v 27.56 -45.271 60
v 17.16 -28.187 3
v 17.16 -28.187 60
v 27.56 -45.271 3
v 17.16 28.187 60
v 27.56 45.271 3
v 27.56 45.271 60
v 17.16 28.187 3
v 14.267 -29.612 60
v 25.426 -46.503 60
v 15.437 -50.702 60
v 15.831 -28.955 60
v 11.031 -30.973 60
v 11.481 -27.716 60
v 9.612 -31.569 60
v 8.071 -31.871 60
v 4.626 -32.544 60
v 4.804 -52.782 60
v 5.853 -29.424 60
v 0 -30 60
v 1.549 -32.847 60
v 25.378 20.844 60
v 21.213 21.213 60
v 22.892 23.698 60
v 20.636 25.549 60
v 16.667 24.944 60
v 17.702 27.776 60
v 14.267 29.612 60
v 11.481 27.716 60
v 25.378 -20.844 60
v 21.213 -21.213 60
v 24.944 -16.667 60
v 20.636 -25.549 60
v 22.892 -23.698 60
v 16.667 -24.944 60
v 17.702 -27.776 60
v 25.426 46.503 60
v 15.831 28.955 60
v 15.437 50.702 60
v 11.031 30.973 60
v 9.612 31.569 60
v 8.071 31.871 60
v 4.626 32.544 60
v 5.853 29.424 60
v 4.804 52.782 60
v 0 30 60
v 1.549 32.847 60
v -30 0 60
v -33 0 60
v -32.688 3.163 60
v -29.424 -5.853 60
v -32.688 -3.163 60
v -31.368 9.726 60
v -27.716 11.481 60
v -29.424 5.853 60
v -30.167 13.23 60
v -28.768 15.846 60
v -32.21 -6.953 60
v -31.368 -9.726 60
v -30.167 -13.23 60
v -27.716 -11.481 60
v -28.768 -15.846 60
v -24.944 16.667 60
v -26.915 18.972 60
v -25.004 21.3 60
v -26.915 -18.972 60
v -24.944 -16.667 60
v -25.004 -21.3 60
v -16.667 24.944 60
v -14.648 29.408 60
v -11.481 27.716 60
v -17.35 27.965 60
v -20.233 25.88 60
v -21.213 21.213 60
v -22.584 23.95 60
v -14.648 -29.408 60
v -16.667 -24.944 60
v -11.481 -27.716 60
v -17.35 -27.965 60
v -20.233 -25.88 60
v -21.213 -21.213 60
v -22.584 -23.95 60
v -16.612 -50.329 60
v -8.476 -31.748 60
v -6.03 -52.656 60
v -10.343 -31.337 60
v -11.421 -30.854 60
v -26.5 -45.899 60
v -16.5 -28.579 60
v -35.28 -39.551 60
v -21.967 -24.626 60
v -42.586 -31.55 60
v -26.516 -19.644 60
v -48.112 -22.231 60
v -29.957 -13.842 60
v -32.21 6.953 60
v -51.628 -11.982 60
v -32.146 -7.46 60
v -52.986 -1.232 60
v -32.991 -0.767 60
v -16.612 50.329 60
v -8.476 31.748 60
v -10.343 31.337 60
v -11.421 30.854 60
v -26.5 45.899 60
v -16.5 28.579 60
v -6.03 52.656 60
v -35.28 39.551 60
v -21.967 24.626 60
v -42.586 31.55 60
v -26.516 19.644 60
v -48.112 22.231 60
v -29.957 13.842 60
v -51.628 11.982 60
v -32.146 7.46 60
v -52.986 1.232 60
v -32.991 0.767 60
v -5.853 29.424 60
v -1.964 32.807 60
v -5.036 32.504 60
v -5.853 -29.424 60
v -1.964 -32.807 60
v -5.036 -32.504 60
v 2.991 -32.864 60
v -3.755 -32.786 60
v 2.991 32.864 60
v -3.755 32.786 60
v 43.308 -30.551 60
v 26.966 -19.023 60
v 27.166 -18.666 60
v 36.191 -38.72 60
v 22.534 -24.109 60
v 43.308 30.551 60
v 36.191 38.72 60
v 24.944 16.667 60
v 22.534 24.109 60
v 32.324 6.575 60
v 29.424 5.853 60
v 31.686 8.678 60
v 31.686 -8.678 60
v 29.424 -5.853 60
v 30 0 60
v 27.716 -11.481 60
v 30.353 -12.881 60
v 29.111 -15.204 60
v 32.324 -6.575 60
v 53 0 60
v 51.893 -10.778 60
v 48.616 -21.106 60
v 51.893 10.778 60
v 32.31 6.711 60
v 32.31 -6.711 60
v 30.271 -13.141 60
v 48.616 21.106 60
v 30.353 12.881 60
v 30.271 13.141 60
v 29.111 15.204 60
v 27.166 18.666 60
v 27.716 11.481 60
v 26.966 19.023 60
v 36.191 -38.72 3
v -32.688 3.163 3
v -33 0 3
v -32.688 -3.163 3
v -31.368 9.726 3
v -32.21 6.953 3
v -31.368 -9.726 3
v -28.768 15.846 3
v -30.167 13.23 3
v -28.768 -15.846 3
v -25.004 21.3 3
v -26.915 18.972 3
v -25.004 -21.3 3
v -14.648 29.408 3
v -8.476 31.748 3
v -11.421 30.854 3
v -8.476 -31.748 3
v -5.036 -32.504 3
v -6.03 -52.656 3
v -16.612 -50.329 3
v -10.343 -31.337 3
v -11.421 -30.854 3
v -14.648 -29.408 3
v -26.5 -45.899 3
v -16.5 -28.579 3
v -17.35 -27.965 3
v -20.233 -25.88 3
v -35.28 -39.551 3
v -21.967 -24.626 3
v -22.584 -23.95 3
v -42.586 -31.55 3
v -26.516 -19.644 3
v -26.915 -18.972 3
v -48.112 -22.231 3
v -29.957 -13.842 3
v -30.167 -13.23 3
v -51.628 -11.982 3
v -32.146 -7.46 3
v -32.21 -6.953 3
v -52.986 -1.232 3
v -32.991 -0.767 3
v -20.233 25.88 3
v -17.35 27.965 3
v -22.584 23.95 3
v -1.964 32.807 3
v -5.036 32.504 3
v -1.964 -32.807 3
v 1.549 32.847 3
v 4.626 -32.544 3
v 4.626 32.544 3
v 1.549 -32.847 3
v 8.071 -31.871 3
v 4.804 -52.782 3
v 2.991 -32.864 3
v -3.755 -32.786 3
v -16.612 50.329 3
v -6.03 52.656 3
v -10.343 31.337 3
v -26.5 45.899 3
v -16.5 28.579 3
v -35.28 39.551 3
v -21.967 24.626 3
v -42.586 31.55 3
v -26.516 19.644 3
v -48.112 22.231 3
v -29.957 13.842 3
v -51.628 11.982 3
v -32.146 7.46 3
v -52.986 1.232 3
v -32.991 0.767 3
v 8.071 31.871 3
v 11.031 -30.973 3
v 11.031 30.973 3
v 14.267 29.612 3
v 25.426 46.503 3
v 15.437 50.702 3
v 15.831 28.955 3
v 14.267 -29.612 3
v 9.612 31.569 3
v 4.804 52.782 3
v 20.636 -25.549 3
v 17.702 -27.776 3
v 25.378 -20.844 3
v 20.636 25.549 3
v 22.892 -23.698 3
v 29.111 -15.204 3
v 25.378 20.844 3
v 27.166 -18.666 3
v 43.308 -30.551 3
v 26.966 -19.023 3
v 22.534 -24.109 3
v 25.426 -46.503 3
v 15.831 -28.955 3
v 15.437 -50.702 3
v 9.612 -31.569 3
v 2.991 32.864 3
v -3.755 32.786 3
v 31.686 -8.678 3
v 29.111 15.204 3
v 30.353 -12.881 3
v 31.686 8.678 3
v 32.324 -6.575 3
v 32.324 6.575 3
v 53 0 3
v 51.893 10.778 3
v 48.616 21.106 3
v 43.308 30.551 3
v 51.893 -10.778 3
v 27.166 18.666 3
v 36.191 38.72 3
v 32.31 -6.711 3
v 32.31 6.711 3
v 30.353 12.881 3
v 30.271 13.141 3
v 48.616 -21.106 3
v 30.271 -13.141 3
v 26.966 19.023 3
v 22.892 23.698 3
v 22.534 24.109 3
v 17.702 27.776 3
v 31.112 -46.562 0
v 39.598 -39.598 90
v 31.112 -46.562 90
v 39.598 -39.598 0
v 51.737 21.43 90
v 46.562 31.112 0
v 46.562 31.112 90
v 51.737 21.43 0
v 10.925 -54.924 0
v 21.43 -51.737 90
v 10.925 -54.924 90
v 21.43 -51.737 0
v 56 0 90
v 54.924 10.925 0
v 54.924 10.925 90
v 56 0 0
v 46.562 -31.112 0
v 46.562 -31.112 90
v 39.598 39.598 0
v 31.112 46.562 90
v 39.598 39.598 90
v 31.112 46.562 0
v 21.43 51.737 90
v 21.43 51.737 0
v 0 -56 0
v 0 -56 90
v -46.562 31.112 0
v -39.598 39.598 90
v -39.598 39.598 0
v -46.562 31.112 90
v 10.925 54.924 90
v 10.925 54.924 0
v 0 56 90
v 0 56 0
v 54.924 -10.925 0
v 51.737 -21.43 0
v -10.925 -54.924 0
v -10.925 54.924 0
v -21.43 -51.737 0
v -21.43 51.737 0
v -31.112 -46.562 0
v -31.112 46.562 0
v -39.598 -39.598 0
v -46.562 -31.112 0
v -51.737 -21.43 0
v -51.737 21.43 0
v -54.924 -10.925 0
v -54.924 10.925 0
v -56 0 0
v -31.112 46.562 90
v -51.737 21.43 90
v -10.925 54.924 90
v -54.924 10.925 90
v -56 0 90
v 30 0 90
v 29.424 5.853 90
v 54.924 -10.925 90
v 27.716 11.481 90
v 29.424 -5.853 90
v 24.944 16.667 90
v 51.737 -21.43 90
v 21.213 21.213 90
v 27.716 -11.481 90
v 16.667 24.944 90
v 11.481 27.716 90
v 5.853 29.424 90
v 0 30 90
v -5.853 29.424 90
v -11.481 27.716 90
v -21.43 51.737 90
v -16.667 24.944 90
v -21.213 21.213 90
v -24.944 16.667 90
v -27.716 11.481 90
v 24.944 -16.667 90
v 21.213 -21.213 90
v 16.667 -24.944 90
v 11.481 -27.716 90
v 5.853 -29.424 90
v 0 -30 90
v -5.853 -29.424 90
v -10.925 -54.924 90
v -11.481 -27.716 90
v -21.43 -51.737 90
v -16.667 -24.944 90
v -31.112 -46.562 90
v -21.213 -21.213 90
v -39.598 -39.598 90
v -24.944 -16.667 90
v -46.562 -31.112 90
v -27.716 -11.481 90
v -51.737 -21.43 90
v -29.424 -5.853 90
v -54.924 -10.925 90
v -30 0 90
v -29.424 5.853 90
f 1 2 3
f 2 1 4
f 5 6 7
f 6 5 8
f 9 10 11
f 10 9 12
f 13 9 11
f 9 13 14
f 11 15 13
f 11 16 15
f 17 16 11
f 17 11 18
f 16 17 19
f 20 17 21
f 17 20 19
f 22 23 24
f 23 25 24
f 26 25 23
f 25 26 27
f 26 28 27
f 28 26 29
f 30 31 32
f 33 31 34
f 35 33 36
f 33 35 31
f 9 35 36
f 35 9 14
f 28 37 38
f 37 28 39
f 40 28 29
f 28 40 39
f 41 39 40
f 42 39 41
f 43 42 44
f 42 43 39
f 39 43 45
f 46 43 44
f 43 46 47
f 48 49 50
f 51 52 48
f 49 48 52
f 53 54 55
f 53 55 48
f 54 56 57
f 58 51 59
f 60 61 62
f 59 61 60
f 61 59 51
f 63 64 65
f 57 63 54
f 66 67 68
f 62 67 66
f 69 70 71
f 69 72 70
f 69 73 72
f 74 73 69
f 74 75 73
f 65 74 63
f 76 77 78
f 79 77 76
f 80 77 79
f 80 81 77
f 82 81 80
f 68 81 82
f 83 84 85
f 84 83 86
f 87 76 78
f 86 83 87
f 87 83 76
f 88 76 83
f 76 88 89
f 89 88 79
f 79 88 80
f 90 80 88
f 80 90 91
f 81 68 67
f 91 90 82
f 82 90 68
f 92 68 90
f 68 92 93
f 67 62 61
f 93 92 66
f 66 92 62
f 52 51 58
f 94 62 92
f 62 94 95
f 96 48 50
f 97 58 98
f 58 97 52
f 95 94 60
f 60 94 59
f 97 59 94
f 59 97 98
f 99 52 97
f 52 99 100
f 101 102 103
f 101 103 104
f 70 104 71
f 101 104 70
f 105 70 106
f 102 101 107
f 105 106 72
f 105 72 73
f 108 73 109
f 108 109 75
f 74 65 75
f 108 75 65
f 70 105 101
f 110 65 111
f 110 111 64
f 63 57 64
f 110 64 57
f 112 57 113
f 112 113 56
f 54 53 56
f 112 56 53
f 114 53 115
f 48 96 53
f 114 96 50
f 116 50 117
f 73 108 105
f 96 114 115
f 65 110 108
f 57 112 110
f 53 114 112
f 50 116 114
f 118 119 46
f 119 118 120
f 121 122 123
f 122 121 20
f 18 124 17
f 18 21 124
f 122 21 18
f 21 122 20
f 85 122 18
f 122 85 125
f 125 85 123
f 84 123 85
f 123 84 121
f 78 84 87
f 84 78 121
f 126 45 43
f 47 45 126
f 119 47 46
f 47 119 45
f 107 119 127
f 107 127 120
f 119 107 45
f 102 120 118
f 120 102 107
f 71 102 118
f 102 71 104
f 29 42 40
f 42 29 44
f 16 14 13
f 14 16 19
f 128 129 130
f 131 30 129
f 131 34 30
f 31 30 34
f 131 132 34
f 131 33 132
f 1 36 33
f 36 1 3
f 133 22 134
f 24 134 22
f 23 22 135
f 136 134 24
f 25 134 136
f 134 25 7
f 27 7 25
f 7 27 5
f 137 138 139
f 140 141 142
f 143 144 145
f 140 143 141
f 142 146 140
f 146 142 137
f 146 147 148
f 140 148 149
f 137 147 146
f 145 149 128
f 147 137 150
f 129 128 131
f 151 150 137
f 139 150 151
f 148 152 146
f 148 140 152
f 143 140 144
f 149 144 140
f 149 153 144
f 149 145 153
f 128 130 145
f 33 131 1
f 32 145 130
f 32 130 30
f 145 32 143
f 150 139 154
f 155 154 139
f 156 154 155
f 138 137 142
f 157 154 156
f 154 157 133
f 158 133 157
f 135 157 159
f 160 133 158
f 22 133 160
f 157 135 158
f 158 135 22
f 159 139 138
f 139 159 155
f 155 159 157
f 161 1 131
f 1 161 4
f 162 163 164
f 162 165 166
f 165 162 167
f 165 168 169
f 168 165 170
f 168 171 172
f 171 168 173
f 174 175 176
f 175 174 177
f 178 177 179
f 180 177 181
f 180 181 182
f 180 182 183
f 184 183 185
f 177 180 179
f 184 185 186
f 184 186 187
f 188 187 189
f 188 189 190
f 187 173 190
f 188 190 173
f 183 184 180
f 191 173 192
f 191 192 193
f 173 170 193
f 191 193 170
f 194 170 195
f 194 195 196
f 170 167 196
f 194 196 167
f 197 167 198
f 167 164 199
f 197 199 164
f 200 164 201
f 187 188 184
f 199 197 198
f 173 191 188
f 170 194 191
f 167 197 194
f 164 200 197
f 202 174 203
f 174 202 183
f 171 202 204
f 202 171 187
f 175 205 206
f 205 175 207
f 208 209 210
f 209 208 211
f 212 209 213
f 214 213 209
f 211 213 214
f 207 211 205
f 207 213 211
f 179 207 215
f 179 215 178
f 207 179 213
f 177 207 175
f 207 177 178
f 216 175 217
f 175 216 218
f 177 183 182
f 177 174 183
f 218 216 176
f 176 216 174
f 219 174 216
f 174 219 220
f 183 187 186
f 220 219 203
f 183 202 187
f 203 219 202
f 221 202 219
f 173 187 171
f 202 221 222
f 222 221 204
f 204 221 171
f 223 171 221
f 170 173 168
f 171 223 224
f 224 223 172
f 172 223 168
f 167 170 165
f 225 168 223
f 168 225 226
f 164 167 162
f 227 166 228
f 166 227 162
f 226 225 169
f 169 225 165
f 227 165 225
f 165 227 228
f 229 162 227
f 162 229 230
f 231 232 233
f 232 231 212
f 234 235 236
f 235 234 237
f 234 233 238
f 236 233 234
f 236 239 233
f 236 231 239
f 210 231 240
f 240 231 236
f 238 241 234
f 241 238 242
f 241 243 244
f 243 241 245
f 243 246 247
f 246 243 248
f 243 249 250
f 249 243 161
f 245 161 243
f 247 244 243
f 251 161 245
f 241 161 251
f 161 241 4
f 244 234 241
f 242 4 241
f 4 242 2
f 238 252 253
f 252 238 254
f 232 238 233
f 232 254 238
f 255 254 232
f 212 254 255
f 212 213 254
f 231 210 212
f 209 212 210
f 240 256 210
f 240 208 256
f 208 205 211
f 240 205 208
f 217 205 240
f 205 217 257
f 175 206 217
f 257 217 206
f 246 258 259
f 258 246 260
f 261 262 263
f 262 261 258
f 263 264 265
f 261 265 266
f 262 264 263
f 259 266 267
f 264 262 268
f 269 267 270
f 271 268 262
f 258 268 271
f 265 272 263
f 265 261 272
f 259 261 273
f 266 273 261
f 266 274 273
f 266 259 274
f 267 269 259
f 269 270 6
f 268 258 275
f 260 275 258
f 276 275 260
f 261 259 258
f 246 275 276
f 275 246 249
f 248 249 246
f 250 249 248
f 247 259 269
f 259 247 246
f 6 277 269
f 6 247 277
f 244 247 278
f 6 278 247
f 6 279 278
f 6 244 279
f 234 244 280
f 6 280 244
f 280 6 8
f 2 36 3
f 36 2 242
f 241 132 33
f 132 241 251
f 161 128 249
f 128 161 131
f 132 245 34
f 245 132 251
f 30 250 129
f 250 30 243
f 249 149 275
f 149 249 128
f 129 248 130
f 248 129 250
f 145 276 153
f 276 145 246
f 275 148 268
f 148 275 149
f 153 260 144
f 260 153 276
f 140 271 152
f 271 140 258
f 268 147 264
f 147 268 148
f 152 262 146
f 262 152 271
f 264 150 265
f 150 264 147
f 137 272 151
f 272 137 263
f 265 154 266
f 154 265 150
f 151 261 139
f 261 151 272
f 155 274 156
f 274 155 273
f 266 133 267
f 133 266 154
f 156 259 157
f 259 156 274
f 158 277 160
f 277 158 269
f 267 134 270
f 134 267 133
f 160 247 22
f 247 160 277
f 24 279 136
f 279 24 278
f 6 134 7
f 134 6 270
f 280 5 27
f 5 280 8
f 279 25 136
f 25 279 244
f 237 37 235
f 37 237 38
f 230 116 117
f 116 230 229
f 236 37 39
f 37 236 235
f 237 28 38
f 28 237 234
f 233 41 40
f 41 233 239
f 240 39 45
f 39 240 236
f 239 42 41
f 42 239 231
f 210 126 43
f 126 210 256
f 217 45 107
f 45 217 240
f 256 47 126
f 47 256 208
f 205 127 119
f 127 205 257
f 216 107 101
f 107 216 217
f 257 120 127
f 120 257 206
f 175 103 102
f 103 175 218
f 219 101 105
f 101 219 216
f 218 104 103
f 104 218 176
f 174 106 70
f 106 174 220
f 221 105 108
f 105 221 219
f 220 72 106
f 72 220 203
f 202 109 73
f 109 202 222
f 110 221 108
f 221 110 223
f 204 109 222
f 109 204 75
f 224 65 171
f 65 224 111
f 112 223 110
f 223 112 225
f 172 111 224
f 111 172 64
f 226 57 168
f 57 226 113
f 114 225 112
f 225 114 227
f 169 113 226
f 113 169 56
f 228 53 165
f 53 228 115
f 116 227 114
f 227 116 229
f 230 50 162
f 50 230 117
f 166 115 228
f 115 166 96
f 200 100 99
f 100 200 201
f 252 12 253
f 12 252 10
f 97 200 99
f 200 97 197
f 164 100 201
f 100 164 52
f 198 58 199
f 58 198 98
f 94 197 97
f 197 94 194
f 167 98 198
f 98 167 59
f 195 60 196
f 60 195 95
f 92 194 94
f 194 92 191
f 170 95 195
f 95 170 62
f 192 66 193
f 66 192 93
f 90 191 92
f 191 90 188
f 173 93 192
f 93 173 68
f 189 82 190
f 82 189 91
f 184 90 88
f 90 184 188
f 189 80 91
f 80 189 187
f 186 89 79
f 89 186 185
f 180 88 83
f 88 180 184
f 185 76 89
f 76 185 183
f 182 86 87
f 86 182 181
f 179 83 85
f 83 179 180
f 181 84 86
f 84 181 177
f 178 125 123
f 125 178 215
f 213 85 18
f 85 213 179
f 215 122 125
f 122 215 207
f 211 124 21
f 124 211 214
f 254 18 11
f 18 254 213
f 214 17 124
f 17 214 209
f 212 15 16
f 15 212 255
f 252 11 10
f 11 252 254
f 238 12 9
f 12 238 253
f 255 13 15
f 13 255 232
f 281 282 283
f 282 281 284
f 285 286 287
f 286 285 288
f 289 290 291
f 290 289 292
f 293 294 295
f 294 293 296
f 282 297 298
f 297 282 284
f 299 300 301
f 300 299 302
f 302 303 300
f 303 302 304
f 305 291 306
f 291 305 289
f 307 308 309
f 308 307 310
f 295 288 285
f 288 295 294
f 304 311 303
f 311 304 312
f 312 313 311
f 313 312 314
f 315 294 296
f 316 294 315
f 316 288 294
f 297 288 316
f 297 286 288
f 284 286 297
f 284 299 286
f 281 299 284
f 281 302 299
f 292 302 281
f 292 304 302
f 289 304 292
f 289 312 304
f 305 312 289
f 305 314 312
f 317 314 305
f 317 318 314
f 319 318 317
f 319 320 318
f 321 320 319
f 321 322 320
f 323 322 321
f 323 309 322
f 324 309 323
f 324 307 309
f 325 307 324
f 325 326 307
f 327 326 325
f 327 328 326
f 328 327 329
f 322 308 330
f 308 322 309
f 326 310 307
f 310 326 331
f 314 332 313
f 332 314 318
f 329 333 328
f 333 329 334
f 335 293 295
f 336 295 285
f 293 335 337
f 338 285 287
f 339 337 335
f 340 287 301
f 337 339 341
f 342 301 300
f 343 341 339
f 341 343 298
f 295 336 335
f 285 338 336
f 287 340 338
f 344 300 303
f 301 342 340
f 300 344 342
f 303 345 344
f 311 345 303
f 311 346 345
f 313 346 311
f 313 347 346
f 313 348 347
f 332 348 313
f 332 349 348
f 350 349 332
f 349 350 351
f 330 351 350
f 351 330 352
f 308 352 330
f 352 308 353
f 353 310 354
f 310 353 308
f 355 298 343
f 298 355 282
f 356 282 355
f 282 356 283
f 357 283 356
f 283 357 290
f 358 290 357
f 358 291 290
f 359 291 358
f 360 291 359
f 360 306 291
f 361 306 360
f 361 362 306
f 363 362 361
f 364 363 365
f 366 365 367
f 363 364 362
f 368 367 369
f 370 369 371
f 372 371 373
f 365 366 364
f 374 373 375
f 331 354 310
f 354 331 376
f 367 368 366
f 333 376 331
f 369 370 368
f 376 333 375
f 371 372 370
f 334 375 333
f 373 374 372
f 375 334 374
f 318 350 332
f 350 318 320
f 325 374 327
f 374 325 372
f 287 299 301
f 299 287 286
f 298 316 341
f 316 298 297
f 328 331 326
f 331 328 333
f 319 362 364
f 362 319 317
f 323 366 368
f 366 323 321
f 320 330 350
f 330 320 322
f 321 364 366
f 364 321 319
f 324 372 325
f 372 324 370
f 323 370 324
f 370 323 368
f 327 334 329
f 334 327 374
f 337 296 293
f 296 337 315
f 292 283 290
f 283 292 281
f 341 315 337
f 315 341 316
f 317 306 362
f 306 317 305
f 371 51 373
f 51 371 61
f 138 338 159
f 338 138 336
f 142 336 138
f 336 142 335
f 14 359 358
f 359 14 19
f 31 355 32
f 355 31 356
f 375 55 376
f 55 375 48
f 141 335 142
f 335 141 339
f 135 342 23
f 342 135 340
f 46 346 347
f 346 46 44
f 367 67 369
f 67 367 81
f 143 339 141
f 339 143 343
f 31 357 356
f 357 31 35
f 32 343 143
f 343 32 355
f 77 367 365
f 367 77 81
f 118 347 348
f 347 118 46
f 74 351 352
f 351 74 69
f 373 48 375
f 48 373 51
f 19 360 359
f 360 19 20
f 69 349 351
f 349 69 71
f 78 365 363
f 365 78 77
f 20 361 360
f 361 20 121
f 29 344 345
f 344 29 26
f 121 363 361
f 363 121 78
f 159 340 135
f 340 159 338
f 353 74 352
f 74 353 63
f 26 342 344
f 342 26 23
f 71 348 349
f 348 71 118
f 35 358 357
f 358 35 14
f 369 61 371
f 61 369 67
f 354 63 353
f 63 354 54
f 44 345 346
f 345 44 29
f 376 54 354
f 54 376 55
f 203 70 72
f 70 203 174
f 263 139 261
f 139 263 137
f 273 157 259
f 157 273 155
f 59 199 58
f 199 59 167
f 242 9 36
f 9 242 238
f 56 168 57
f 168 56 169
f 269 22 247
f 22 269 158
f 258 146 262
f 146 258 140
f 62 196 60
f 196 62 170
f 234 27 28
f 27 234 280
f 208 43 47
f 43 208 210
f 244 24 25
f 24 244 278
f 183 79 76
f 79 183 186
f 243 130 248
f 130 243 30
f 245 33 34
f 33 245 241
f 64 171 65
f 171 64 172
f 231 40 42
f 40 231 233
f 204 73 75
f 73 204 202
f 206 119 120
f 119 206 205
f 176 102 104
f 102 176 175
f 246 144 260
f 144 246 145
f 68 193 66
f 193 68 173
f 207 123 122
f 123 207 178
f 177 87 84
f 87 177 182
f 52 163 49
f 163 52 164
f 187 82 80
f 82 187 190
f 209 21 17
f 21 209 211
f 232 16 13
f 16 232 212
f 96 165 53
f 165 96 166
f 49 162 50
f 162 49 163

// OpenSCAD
// Stiftköcher mit innerem Kern + schmalem Außenring (mit echten Fächern)
// Version 2.1

// --- Parameter ---
inner_diameter      = 60;   // Durchmesser des inneren Hauptfachs (mm)
inner_height        = 90;   // Höhe des inneren Fachs (mm)

outer_ring_width    = 20;   // Breite des äußeren Ringes (mm)
outer_height        = 60;   // Höhe des äußeren Ringes (mm)

wall_thickness      = 3;    // Außenwandstärke (mm)
bottom_thickness    = 3;    // Bodenstärke (mm)

outer_compartments  = 3;   // Anzahl der schmalen Außenfächer
outer_wall_thickness= 2;    // Dicke der Zwischenwände (mm) — wird in Winkel umgerechnet

$fn = 32; // Glätte für Rundungen

// --- Hilfsfunktion: Grad/Rad ---
function rad2deg(a) = a * 180 / PI;

// --- Modul: Ringschneide-Sektor (für Hohlräume der Außenfächer) ---
module ring_sector(r_in, r_out, angle_deg, h) {
    // Rechteck: (radiale Dicke x Höhe) wird um Z rotiert -> Torus-Segment
    rotate([0,0,-angle_deg/2])  // Zentriere den Sektor um 0°
    rotate_extrude(angle = angle_deg, convexity = 10)
        translate([r_in, 0, 0])
            square([r_out - r_in, h], center = false);
}

// --- Hauptmodul ---
module pen_holder() {
    inner_r = inner_diameter/2;
    outer_shell_r = inner_r + wall_thickness + outer_ring_width + wall_thickness;

    // 1) Außenkörper (Mantel + Boden)
    difference() {
        // Vollkörper außen
        union() {
            cylinder(h = max(inner_height, outer_height), r = outer_shell_r);
            // Optional: leichte Fase oben
            // translate([0,0,max(inner_height,outer_height)-1])
            //     cylinder(h=1, r1=outer_shell_r, r2=outer_shell_r-1);
        }

        // Innenaushöhlung: großes Innenfach
        translate([0,0,bottom_thickness])
            cylinder(h = inner_height - bottom_thickness, r = inner_r);

        // Außenring freistellen (zwischen innerer Wand und äußeren Wand)
        translate([0,0,bottom_thickness])
            cylinder(h = outer_height - bottom_thickness, r = inner_r + wall_thickness);

        // 2) Fächer im Außenring als ausgesparte Sektoren
        // Winkelberechnung: Wanddicke in Winkel am mittleren Ringradius
        ring_r_in   = inner_r + wall_thickness;
        ring_r_out  = ring_r_in + outer_ring_width;
        ring_mid_r  = (ring_r_in + ring_r_out) / 2;

        wall_angle_deg = rad2deg(outer_wall_thickness / ring_mid_r); // Bogen -> Winkel
        base_angle_deg = 360 / outer_compartments;
        slot_angle_deg = max(1, base_angle_deg - wall_angle_deg);     // Öffnungswinkel pro Fach

        // Aussparungen für alle Außenfächer
        for (i = [0:outer_compartments-1]) {
            angle_center = i * base_angle_deg;
            // Sektor anheben, damit Boden stehen bleibt
            translate([0,0,bottom_thickness])
                rotate([0,0,angle_center])
                    ring_sector(ring_r_in, ring_r_out, slot_angle_deg, outer_height - bottom_thickness);
        }
    }
}

// --- Aufruf ---
pen_holder();
